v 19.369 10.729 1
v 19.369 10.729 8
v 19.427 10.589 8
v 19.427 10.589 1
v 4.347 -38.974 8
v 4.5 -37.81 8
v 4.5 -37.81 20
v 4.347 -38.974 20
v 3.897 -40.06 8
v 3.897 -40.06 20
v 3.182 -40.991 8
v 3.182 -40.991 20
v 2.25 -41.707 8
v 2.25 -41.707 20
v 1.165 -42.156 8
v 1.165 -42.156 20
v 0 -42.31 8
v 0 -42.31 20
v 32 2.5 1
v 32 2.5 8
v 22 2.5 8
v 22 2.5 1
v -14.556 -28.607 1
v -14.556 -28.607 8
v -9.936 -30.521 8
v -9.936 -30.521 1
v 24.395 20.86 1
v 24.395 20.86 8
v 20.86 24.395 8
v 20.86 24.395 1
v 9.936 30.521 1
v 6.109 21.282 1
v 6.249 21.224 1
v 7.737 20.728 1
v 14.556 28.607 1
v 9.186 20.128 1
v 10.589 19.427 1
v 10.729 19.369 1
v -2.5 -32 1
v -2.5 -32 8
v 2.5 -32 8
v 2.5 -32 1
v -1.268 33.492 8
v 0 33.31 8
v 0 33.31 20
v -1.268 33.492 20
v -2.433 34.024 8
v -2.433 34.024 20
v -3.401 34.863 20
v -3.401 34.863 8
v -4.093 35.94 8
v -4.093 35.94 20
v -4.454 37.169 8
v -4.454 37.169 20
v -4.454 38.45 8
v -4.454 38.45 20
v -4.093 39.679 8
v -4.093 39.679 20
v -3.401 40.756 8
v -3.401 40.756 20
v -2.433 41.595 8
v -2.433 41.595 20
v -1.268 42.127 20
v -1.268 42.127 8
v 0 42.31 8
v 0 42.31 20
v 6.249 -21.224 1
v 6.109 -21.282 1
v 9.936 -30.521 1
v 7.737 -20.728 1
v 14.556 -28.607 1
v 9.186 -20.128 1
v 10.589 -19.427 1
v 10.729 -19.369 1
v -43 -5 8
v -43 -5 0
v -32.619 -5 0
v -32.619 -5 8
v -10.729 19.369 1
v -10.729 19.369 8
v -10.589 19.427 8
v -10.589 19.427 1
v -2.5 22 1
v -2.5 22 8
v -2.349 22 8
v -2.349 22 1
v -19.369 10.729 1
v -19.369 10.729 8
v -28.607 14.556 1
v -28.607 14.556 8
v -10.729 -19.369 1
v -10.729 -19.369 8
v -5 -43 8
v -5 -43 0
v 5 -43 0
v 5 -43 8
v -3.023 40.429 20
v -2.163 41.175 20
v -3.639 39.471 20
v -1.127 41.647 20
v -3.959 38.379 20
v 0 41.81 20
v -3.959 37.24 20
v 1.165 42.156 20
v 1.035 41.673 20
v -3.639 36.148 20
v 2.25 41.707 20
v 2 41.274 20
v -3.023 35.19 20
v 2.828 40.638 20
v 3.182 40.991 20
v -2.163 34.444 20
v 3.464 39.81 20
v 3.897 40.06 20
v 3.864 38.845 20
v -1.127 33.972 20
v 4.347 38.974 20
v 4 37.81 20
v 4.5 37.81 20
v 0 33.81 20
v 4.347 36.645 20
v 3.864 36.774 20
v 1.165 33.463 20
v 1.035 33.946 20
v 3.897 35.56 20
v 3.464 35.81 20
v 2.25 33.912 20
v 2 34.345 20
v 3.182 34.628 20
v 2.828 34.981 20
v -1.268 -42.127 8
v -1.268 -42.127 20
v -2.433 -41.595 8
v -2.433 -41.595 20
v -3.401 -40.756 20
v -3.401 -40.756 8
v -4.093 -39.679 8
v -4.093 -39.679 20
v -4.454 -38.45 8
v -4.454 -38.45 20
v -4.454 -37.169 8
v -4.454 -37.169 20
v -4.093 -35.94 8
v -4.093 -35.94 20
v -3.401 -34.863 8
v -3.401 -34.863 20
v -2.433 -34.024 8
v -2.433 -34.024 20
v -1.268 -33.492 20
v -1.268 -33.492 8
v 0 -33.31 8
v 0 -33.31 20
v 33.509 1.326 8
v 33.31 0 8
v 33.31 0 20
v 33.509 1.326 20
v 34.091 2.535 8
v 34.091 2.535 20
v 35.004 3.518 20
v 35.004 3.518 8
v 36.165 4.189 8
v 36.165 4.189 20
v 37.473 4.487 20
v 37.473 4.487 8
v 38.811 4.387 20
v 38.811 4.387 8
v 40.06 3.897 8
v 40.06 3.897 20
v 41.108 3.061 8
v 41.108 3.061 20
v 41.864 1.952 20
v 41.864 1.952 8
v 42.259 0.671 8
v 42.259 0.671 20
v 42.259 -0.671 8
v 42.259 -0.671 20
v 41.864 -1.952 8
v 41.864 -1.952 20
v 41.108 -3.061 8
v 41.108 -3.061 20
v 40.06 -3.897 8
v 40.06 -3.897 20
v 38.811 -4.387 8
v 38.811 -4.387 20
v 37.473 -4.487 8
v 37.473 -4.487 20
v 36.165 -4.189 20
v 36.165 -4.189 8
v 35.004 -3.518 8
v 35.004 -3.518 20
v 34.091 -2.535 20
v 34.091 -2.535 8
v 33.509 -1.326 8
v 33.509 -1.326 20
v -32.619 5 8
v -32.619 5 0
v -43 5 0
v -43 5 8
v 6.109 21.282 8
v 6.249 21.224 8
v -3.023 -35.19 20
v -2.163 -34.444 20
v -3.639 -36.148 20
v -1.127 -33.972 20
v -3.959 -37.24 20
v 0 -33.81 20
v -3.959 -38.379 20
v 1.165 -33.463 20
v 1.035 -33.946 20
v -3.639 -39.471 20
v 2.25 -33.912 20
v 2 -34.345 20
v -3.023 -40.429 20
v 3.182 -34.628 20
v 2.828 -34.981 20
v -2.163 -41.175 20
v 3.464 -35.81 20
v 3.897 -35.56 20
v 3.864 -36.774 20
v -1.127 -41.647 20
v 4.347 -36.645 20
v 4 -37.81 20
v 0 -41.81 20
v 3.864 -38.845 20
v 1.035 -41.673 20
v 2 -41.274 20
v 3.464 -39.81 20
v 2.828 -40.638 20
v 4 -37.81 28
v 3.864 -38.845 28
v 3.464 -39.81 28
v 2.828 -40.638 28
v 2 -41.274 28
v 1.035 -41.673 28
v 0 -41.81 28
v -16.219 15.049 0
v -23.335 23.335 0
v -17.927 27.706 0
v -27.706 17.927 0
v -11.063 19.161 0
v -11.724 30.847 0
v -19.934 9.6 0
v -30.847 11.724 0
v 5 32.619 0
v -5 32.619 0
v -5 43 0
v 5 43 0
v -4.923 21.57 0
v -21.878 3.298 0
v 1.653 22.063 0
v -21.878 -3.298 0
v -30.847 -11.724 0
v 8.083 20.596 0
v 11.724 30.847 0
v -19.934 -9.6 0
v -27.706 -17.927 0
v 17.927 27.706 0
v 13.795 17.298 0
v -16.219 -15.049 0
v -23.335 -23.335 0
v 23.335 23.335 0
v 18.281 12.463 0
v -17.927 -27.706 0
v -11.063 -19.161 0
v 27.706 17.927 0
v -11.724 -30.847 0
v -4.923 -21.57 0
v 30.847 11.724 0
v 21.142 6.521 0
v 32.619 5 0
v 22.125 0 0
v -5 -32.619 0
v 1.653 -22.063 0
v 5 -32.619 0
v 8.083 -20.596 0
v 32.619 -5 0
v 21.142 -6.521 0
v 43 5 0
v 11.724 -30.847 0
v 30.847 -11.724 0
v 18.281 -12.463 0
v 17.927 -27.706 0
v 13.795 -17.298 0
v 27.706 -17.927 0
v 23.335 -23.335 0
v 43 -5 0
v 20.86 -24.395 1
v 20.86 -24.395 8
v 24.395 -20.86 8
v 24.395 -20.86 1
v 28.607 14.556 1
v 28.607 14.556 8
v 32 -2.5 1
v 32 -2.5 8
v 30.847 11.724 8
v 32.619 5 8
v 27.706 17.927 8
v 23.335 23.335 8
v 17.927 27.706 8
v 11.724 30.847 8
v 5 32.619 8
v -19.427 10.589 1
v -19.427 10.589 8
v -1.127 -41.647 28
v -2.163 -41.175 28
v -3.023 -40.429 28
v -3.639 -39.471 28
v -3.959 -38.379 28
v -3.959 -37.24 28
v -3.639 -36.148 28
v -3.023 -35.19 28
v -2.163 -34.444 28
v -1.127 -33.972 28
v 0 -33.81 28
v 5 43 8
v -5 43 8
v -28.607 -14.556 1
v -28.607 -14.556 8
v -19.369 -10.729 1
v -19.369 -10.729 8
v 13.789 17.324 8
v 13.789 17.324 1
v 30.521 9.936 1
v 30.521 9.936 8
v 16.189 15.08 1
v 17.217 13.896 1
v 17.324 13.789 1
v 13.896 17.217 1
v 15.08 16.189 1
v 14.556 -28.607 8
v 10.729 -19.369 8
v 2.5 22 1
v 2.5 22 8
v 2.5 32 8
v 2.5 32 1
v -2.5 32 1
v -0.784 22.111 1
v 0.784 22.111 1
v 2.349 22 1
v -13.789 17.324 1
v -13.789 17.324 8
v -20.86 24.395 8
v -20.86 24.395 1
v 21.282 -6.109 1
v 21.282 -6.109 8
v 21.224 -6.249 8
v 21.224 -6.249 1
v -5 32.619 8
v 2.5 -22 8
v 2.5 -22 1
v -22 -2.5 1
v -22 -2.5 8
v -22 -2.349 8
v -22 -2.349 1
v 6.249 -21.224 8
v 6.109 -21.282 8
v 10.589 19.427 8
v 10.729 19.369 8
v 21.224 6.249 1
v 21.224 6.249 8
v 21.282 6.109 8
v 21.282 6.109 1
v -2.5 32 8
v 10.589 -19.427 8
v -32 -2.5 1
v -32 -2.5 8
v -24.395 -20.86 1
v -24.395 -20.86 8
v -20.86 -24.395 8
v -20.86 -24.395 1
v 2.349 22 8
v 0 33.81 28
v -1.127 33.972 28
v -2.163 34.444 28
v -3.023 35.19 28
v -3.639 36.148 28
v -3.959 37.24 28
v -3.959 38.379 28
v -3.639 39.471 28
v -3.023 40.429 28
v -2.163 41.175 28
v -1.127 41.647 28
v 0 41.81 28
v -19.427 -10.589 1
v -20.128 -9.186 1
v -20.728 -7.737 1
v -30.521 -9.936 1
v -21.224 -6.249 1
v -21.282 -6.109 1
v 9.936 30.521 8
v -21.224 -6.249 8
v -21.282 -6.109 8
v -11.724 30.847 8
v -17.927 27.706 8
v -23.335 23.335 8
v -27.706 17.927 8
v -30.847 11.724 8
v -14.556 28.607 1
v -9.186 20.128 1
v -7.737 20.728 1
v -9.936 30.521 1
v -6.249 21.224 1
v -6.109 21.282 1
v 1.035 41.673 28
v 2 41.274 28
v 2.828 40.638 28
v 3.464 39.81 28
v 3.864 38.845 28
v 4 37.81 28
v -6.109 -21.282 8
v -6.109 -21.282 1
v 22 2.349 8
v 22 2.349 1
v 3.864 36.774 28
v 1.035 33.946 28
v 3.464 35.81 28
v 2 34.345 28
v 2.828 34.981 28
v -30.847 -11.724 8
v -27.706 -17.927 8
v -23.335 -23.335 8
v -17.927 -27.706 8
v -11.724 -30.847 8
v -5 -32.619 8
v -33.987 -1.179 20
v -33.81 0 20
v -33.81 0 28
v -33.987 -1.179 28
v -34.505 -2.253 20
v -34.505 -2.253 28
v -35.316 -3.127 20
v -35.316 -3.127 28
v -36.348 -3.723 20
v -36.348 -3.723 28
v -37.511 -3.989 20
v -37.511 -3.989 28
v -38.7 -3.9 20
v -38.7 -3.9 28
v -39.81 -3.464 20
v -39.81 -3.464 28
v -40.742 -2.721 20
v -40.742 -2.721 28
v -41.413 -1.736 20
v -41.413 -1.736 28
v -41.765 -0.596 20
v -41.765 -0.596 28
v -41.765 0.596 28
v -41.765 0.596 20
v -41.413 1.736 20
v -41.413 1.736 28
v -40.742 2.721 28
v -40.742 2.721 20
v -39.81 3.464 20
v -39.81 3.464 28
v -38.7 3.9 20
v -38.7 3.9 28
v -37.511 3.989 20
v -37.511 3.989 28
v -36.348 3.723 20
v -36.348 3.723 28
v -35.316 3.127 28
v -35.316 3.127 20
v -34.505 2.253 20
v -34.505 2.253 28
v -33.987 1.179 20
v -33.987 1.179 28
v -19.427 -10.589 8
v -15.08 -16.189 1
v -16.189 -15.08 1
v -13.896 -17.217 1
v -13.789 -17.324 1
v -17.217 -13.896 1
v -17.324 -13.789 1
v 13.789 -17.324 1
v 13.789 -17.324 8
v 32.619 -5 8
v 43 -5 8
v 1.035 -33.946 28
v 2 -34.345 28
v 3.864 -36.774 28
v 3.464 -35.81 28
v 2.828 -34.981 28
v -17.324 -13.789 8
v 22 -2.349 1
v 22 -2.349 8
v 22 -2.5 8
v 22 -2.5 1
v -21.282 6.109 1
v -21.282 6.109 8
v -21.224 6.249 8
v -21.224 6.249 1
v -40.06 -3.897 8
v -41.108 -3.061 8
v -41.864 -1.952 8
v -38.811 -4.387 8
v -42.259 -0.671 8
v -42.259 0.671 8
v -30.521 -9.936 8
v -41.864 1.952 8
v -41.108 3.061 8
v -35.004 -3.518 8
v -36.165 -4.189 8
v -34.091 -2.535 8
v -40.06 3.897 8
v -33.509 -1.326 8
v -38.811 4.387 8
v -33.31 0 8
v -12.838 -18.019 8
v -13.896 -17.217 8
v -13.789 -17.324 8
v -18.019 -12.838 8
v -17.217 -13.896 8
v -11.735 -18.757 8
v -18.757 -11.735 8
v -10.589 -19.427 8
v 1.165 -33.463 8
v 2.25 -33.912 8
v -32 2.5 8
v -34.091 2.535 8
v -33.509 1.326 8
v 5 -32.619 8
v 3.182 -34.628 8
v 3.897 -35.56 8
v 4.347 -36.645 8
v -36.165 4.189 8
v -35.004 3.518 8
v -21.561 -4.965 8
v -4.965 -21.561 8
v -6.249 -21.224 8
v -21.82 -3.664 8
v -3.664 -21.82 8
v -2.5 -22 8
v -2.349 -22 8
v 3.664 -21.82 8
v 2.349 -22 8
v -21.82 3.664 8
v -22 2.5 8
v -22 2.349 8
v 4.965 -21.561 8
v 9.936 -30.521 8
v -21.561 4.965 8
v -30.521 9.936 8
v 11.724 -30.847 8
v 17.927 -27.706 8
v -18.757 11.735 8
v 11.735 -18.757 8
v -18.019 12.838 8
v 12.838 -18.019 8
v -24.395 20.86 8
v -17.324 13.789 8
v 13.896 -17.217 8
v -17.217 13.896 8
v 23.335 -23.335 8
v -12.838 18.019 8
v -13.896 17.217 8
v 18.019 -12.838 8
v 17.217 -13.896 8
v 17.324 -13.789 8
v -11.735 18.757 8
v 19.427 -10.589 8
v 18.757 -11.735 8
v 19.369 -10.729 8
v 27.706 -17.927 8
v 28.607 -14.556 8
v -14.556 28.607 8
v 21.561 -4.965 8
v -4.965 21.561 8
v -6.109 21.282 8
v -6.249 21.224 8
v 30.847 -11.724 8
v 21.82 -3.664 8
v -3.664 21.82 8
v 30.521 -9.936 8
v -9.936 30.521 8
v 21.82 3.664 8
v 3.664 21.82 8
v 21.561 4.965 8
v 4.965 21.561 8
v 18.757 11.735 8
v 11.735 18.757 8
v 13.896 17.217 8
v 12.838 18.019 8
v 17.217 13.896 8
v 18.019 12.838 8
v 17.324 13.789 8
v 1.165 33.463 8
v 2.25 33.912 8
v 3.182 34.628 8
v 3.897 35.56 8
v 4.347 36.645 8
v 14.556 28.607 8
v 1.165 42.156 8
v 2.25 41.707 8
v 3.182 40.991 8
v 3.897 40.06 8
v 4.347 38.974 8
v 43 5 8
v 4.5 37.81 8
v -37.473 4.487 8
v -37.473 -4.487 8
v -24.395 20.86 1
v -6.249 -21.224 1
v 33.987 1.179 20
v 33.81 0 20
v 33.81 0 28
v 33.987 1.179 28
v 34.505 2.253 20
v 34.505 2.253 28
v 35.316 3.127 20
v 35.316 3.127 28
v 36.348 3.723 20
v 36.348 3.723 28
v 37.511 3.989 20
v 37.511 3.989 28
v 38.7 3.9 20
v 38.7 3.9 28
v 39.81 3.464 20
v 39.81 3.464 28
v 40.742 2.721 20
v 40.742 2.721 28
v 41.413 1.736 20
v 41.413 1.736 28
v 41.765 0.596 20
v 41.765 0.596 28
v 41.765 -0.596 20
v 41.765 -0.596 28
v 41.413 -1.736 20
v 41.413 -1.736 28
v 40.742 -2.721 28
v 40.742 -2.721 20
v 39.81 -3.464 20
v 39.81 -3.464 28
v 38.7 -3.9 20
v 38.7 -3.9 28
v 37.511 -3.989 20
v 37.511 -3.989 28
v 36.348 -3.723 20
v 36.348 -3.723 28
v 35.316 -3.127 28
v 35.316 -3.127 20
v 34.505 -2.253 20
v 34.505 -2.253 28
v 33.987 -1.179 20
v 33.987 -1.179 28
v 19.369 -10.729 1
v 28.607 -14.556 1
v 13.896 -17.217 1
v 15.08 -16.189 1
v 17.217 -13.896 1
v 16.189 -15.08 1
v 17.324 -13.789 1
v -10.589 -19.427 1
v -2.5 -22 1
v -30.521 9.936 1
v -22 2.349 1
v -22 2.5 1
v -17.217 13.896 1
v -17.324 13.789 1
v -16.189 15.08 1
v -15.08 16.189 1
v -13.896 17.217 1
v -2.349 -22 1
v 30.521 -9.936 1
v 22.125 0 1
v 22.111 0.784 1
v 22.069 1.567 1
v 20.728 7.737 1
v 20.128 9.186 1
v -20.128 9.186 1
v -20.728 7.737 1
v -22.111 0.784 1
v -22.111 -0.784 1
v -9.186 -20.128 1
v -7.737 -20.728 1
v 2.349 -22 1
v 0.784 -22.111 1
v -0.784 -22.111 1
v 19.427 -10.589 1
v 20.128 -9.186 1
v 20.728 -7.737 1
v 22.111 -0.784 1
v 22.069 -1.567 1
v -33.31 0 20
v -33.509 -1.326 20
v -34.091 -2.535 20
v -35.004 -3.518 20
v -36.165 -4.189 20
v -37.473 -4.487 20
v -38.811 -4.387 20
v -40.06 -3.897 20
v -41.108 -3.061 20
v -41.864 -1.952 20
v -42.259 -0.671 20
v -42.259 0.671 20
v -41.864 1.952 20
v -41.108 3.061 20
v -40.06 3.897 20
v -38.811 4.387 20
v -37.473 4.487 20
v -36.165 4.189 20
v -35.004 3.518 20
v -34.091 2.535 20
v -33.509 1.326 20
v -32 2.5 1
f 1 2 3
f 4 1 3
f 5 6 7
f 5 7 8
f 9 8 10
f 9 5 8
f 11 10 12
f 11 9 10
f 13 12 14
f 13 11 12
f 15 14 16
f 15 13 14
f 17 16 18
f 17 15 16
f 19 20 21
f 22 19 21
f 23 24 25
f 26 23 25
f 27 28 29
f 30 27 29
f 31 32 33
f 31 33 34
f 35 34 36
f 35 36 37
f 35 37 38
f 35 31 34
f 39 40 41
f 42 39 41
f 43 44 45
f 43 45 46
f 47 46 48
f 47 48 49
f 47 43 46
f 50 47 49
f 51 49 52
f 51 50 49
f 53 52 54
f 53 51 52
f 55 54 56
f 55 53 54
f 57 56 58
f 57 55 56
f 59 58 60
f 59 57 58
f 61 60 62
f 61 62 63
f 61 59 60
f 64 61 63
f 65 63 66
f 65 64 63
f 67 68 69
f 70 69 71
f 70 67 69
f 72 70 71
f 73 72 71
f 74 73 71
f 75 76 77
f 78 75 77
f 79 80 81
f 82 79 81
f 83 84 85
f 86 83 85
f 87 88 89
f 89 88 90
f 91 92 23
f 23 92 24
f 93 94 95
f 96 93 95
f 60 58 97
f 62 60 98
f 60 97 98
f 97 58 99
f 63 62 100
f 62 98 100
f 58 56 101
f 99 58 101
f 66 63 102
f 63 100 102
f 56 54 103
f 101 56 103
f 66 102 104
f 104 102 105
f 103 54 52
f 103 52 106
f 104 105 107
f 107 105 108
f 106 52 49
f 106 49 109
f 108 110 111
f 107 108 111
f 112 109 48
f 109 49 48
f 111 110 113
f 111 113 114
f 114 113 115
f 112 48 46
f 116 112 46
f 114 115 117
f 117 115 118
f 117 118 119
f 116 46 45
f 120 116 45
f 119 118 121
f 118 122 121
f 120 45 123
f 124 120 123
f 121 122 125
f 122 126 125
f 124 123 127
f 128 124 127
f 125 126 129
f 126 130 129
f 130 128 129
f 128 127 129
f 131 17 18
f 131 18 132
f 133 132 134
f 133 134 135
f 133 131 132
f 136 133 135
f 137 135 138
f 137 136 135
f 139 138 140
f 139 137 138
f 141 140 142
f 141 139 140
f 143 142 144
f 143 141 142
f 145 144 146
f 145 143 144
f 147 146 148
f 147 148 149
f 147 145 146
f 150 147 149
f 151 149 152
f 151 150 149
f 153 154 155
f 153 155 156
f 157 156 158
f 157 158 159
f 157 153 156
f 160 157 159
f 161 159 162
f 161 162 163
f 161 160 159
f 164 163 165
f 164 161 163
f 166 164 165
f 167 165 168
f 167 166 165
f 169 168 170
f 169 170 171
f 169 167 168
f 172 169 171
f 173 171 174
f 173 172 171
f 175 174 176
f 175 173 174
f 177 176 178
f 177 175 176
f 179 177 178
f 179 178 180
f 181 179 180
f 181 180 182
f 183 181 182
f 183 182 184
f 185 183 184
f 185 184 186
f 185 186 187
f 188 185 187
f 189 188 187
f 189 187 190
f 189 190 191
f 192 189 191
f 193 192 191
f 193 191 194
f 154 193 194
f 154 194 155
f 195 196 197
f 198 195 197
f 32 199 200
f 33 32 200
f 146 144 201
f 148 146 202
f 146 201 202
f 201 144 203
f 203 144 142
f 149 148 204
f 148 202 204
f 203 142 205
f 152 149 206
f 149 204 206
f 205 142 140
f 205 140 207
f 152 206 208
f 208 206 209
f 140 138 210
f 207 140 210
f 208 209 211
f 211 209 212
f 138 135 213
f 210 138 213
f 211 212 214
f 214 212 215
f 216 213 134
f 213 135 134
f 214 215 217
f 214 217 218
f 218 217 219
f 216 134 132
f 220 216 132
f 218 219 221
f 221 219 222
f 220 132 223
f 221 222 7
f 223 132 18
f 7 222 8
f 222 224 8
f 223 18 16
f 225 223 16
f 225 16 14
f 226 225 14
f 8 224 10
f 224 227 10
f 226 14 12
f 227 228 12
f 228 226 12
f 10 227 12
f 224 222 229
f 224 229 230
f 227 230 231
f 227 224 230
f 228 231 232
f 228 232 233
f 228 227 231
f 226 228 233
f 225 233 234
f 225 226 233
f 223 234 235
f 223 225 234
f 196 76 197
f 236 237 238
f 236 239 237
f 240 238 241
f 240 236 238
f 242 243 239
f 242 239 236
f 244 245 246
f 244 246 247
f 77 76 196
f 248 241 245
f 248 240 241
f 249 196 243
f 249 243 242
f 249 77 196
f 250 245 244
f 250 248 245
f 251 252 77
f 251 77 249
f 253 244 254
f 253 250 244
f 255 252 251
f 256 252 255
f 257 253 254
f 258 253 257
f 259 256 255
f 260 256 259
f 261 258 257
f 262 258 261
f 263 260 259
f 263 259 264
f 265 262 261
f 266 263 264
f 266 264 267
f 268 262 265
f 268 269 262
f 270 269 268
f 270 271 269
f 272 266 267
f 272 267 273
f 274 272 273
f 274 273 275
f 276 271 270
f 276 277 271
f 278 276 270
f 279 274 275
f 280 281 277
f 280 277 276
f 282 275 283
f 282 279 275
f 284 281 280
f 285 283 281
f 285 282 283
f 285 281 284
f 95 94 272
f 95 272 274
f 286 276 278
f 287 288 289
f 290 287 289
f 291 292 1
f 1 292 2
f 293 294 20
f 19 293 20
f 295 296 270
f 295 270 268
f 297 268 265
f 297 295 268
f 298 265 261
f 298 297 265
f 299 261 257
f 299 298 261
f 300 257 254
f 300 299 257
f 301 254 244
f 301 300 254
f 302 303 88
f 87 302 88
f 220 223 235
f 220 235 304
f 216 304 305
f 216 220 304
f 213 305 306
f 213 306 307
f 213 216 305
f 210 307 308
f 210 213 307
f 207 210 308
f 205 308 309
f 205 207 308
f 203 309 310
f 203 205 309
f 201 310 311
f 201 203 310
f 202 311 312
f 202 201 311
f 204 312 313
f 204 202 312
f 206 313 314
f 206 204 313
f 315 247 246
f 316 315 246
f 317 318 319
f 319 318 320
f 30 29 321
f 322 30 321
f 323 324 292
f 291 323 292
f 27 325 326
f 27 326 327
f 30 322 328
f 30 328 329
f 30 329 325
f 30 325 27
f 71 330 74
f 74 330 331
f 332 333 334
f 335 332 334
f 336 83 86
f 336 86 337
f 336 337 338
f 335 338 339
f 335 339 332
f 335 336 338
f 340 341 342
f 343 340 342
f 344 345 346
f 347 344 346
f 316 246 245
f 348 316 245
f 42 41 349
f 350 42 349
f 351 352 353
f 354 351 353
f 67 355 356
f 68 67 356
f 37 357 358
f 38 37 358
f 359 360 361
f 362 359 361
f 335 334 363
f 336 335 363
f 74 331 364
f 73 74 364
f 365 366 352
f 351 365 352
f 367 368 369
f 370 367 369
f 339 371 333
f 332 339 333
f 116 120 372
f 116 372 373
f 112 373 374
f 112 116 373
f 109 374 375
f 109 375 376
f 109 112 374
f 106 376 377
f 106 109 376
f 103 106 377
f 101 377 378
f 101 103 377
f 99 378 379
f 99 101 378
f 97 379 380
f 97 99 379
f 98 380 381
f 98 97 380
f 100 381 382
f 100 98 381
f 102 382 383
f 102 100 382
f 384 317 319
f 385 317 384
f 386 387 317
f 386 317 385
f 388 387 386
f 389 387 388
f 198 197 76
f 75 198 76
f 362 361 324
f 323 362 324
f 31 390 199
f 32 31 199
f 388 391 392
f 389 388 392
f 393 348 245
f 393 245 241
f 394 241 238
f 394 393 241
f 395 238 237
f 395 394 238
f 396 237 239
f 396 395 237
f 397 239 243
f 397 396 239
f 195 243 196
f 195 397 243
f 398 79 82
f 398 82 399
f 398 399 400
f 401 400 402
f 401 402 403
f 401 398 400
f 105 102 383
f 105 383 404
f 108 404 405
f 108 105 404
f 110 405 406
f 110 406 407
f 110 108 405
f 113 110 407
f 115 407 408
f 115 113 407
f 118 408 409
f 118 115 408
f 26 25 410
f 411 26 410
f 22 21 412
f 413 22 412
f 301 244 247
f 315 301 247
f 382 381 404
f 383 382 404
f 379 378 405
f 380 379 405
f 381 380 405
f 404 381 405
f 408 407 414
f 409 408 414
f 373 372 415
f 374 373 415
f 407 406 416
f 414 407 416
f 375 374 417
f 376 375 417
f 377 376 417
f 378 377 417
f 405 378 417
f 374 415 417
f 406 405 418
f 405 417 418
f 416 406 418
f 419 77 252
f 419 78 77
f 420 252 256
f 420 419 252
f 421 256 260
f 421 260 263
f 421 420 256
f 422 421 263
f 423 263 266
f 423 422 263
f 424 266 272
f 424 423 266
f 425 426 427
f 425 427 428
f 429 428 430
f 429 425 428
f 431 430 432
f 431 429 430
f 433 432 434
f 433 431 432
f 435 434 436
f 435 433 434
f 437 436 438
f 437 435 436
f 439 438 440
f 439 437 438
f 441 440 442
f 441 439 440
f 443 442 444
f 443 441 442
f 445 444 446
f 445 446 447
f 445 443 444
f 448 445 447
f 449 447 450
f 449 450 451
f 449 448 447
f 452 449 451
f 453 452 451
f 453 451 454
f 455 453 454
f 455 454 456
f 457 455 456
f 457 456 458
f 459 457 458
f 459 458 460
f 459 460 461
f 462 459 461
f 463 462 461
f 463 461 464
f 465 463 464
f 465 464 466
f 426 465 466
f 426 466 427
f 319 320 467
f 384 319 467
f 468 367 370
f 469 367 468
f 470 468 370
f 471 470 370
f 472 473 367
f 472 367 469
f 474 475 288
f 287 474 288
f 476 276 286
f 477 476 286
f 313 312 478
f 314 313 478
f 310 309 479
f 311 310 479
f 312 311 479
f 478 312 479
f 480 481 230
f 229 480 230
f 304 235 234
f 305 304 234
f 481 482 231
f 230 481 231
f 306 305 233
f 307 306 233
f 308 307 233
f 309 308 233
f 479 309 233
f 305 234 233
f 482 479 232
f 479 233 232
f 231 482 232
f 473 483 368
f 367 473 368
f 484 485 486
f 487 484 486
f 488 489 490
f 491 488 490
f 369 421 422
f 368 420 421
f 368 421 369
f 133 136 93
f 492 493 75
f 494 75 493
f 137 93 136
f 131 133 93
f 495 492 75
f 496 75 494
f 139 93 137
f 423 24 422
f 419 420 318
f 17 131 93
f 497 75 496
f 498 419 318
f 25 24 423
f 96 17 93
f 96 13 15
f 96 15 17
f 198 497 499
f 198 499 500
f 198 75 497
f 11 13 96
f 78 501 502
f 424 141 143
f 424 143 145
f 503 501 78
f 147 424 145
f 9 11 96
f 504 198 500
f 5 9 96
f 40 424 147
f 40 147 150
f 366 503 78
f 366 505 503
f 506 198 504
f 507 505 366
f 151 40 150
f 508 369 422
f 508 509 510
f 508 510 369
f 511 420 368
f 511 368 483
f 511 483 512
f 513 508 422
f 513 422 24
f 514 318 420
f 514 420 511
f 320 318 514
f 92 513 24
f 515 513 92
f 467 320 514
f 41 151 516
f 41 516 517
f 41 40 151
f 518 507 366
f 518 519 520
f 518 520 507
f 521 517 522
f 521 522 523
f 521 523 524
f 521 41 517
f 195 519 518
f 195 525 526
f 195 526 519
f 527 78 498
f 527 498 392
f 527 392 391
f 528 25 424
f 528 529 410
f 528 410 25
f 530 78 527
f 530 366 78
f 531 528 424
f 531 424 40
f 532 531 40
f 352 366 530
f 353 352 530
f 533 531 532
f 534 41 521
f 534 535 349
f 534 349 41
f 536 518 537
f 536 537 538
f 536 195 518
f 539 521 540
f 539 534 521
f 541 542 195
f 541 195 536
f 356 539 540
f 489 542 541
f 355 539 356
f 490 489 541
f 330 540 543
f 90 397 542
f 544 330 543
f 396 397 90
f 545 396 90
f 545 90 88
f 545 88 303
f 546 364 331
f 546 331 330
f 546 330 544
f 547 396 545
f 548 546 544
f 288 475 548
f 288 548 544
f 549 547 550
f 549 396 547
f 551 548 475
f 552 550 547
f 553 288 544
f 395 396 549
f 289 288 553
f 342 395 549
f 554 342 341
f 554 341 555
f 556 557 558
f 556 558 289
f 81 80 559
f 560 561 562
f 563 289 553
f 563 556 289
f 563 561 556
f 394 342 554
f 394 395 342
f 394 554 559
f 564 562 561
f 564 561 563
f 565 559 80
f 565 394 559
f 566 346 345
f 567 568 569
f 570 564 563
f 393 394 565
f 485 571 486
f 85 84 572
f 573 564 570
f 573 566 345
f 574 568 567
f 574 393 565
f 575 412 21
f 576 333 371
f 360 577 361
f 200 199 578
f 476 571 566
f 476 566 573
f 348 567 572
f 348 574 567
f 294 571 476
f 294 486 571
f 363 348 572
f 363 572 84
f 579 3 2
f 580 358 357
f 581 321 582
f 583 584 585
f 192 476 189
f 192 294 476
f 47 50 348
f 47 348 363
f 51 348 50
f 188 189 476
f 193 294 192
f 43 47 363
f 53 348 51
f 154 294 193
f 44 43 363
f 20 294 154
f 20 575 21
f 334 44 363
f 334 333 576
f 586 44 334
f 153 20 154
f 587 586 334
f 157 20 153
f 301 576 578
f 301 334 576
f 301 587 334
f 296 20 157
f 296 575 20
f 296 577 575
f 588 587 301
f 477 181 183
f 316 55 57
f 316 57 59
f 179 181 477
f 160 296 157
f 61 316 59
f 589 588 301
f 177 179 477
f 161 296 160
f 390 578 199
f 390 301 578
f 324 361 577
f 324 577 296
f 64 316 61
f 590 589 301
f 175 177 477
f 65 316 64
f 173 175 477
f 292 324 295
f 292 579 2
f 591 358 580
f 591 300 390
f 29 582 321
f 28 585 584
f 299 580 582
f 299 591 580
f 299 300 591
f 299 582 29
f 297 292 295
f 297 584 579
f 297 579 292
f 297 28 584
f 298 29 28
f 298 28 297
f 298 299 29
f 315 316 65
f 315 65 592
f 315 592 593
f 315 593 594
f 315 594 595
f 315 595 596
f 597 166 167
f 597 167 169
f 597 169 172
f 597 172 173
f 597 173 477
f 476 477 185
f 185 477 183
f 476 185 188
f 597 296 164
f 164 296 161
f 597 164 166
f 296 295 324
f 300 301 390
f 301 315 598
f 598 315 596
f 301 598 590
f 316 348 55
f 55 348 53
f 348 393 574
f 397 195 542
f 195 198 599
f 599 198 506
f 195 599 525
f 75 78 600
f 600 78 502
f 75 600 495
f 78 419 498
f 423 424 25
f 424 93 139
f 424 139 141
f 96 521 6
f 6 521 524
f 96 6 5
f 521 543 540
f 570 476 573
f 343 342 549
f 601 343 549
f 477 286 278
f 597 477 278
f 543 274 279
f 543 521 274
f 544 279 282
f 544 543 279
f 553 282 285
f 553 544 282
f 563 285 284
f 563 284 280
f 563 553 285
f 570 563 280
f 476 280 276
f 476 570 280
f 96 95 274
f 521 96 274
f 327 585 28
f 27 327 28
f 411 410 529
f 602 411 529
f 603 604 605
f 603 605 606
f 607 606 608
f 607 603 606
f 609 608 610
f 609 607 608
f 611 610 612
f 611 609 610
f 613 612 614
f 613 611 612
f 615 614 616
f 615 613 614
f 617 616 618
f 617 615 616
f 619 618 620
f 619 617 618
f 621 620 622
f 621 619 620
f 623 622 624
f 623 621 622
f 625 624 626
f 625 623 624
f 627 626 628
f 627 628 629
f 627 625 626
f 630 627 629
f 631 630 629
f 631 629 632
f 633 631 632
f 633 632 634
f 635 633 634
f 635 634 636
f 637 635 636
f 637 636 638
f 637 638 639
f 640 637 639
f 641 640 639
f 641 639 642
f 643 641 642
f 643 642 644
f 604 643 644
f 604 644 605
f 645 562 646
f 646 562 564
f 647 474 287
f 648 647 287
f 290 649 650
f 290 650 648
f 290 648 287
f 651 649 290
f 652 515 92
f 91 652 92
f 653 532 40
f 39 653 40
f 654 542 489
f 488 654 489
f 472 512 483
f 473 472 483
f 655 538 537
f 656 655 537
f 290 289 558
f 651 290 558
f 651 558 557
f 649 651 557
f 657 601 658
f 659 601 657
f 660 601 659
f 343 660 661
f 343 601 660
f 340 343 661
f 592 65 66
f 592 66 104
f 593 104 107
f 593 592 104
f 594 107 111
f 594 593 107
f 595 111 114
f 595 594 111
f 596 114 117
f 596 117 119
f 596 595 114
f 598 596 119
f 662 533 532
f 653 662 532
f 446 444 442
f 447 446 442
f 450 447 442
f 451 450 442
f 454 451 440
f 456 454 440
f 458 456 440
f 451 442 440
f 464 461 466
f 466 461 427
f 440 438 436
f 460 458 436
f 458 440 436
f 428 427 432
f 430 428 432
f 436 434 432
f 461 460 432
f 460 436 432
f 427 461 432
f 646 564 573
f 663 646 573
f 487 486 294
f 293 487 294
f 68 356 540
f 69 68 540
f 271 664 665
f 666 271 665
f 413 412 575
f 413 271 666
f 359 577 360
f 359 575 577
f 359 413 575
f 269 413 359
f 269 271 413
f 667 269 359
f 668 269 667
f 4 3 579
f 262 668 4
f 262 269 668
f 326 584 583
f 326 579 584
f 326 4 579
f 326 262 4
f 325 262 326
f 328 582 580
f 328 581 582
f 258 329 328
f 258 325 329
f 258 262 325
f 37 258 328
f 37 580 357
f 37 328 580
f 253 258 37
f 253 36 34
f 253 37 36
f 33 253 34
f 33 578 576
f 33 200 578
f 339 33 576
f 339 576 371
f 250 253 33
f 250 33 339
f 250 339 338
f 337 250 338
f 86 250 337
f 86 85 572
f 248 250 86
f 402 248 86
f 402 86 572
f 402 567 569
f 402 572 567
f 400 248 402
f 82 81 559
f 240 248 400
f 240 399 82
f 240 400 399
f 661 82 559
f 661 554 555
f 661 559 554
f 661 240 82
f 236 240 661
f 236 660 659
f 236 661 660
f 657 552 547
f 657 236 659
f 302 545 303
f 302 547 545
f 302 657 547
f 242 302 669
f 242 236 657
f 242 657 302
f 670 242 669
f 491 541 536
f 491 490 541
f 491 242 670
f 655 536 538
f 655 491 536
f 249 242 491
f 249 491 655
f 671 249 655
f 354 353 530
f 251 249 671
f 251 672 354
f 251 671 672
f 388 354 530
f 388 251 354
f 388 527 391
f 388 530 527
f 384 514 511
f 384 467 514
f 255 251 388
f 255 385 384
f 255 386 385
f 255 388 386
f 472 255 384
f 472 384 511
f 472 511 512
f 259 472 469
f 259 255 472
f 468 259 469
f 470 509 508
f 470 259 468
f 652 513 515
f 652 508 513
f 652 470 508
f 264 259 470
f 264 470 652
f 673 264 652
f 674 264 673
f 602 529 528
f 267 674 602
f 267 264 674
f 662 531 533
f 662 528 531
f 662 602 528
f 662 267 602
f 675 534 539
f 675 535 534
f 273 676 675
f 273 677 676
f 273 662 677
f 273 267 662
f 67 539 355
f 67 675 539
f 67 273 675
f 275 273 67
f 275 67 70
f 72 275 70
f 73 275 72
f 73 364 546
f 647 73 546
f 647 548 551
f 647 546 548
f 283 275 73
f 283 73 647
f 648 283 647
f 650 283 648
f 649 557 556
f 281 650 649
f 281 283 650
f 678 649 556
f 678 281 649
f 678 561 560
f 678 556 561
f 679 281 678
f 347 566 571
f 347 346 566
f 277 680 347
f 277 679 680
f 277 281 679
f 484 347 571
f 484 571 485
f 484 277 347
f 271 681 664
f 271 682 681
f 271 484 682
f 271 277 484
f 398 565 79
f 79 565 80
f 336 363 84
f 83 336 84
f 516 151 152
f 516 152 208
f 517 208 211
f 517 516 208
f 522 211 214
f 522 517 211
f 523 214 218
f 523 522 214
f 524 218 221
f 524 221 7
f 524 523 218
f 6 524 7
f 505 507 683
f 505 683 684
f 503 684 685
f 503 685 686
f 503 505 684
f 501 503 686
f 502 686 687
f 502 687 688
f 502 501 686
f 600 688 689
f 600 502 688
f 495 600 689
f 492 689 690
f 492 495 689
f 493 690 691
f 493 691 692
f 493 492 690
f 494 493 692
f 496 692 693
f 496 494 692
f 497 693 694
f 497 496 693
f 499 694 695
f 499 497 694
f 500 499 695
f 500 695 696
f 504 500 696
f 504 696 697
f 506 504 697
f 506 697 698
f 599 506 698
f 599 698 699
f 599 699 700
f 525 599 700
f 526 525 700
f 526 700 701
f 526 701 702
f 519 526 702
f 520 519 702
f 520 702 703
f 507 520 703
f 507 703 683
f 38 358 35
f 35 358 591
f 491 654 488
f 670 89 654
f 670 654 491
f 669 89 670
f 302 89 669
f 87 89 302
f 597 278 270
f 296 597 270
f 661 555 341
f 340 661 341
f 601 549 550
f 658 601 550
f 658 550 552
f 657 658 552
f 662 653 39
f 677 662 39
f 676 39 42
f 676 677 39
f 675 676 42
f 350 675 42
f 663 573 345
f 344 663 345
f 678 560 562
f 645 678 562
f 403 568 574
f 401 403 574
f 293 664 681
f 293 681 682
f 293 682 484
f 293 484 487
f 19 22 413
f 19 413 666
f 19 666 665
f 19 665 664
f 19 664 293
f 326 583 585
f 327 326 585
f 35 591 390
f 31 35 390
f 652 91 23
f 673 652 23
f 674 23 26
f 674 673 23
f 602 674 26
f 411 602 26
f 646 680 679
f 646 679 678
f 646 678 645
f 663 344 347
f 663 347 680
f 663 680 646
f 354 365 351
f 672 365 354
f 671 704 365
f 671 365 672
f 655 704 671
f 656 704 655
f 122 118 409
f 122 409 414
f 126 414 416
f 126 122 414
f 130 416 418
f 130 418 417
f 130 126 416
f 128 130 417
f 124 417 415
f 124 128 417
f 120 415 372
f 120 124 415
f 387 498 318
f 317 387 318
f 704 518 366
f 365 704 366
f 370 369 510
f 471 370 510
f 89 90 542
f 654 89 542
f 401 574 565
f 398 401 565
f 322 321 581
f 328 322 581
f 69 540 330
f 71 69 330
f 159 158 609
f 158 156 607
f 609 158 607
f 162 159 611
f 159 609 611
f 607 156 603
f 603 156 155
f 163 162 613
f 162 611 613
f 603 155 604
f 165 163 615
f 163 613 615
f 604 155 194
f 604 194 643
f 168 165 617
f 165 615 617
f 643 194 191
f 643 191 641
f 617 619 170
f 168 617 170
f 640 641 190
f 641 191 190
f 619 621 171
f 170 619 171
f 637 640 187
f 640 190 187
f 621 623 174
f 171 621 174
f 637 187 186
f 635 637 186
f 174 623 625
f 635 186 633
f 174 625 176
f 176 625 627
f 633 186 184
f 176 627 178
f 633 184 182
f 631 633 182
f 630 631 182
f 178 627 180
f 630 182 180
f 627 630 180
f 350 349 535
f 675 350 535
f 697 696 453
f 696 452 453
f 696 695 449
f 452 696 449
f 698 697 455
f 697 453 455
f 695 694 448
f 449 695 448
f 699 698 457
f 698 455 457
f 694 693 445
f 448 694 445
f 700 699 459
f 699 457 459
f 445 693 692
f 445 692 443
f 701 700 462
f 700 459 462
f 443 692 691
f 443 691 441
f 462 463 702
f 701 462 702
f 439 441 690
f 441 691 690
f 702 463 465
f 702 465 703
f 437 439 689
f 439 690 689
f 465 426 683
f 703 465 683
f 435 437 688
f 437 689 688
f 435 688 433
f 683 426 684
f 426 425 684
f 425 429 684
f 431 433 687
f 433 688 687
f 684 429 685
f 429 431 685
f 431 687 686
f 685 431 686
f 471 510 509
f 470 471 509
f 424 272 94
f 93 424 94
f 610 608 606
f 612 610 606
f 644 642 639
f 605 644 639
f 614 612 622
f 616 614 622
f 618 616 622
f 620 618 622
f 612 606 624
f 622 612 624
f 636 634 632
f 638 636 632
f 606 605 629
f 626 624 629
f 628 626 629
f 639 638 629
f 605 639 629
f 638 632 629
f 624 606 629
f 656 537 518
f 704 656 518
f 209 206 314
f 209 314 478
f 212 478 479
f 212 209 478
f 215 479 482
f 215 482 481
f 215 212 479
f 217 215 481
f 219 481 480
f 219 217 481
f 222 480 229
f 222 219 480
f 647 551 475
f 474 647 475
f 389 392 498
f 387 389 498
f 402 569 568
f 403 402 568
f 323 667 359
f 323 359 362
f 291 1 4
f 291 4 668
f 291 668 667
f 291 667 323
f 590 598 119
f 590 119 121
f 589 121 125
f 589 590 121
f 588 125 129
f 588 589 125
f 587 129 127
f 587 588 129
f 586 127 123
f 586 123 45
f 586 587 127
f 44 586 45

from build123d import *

# Parameters (mm, degrees)
F0_W      = 33
F0_H      = 8
F2_R      = 22.125
F3_DEPTH  = 25
F5_DEPTH  = 7
F7_DEPTH  = 8
F8_R      = 4
F9_DEPTH  = 25
F10_R     = 4.5
F10_R_2   = 4
F11_DEPTH = 20
F12_DEPTH = 28


with BuildPart() as f1:
    # F0 (on Front) → F1 (revolve)
    with BuildSketch(Plane.XZ):
        with Locations((16.5, 4)):
            Rectangle(F0_W, F0_H)
    revolve(axis=Axis((0, 0, 4), (0, 0, 1)))

    # F2 (on Top) → F3 (cut)
    with BuildSketch(Plane.XY):
        Circle(F2_R)
    extrude(amount=F3_DEPTH, mode=Mode.SUBTRACT)

    # F4 (on face) → F5 (cut)
    with BuildSketch(Plane.XY.offset(8)):
        Polygon((-2.5, 22), (0, 22), (2.5, 22), (2.5, 32), (-2.5, 32), align=None)
        Polygon((-14.555568667, 28.6074364594), (-10.7287343433, 19.3686411343), (-8.419035512, 20.3253497152), (-6.1093366808, 21.2820582962), (-9.9361710044, 30.5208536213), align=None)
        Polygon((-24.3951839509, 20.859650045), (-17.3241161391, 13.7885822331), (-15.5563491861, 15.5563491861), (-13.7885822331, 17.3241161391), (-20.859650045, 24.3951839509), align=None)
        Polygon((-30.5208536213, 9.9361710044), (-21.2820582962, 6.1093366808), (-20.3253497152, 8.419035512), (-19.3686411343, 10.7287343433), (-28.6074364594, 14.555568667), align=None)
        Polygon((-32, -2.5), (-22, -2.5), (-22, 0), (-22, 2.5), (-32, 2.5), align=None)
        Polygon((-28.6074364594, -14.555568667), (-19.3686411343, -10.7287343433), (-20.3253497152, -8.419035512), (-21.2820582962, -6.1093366808), (-30.5208536213, -9.9361710044), align=None)
        Polygon((-20.859650045, -24.3951839509), (-13.7885822331, -17.3241161391), (-15.5563491861, -15.5563491861), (-17.3241161391, -13.7885822331), (-24.3951839509, -20.859650045), align=None)
        Polygon((-9.9361710044, -30.5208536213), (-6.1093366808, -21.2820582962), (-8.419035512, -20.3253497152), (-10.7287343433, -19.3686411343), (-14.555568667, -28.6074364594), align=None)
        Polygon((2.5, -32), (2.5, -22), (0, -22), (-2.5, -22), (-2.5, -32), align=None)
        Polygon((14.555568667, -28.6074364594), (10.7287343433, -19.3686411343), (8.419035512, -20.3253497152), (6.1093366808, -21.2820582962), (9.9361710044, -30.5208536213), align=None)
        Polygon((24.3951839509, -20.859650045), (17.3241161391, -13.7885822331), (15.5563491861, -15.5563491861), (13.7885822331, -17.3241161391), (20.859650045, -24.3951839509), align=None)
        Polygon((30.5208536213, -9.9361710044), (21.2820582962, -6.1093366808), (20.3253497152, -8.419035512), (19.3686411343, -10.7287343433), (28.6074364594, -14.555568667), align=None)
        Polygon((32, 2.5), (22, 2.5), (22, 0), (22, -2.5), (32, -2.5), align=None)
        Polygon((28.6074364594, 14.555568667), (19.3686411343, 10.7287343433), (20.3253497152, 8.419035512), (21.2820582962, 6.1093366808), (30.5208536213, 9.9361710044), align=None)
        Polygon((20.859650045, 24.3951839509), (13.7885822331, 17.3241161391), (15.5563491861, 15.5563491861), (17.3241161391, 13.7885822331), (24.3951839509, 20.859650045), align=None)
        Polygon((9.9361710044, 30.5208536213), (6.1093366808, 21.2820582962), (8.419035512, 20.3253497152), (10.7287343433, 19.3686411343), (14.555568667, 28.6074364594), align=None)
    extrude(amount=-F5_DEPTH, mode=Mode.SUBTRACT)

    # F6 (on Top) → F7 (join)
    with BuildSketch(Plane.XY):
        Polygon((43, -5), (43, 0), (43, 5), (32.6190128606, 5), (32.6190128606, -5), align=None)
        Polygon((5, 32.6190128606), (5, 43), (0, 43), (-5, 43), (-5, 32.6190128606), align=None)
        Polygon((-32.6190128606, 5), (-43, 5), (-43, 0), (-43, -5), (-32.6190128606, -5), align=None)
        Polygon((-5, -32.6190128606), (-5, -43), (0, -43), (5, -43), (5, -32.6190128606), align=None)
    extrude(amount=F7_DEPTH)

    # F8 (on face) → F9 (cut)
    with BuildSketch(Plane.XY.offset(8)):
        with Locations((0, 37.8095064303)):
            Circle(F8_R)
        with Locations((37.8095064303, 0)):
            Circle(F8_R)
        with Locations((-37.8095064303, 0)):
            Circle(F8_R)
        with Locations((0, -37.8095064303)):
            Circle(F8_R)
    extrude(amount=-F9_DEPTH, mode=Mode.SUBTRACT)

    # F10 (on face) → F11 (join)
    with BuildSketch(Plane(origin=(0, 0, 0), x_dir=(1, 0, 0), z_dir=(0, 0, -1))):
        with BuildLine():
            Line((0, -41.8095064303), (0, -37.8095064303))
            Line((0, -37.8095064303), (0, -33.8095064303))
            ThreePointArc((0, -33.8095064303), (-4, -37.8095064303), (0, -41.8095064303))
        make_face()
        with BuildLine():
            Line((0, -33.8095064303), (0, -37.8095064303))
            Line((0, -37.8095064303), (0, -41.8095064303))
            ThreePointArc((0, -41.8095064303), (2.8284271247, -40.637933555), (4, -37.8095064303))
            ThreePointArc((4, -37.8095064303), (2.8284271247, -34.9810793056), (0, -33.8095064303))
        make_face()
        with BuildLine():
            ThreePointArc((42.3095064303, 0), (37.8095064303, 4.5), (33.3095064303, 0))
            ThreePointArc((33.3095064303, 0), (37.8095064303, -4.5), (42.3095064303, 0))
        make_face()
        with BuildLine():
            ThreePointArc((41.8095064303, 0), (37.8095064303, -4), (33.8095064303, 0))
            ThreePointArc((33.8095064303, 0), (37.8095064303, 4), (41.8095064303, 0))
        make_face(mode=Mode.SUBTRACT)
        with BuildLine():
            ThreePointArc((0, 41.8095064303), (-4, 37.8095064303), (0, 33.8095064303))
            Line((0, 33.8095064303), (0, 37.8095064303))
            Line((0, 37.8095064303), (0, 41.8095064303))
        make_face()
        with BuildLine():
            Line((0, 37.8095064303), (0, 33.8095064303))
            ThreePointArc((0, 33.8095064303), (2.8284271247, 34.9810793056), (4, 37.8095064303))
            ThreePointArc((4, 37.8095064303), (2.8284271247, 40.637933555), (0, 41.8095064303))
            Line((0, 41.8095064303), (0, 37.8095064303))
        make_face()
        with BuildLine():
            Line((0, -33.3095064303), (0, -33.8095064303))
            ThreePointArc((0, -33.8095064303), (2.8284271247, -34.9810793056), (4, -37.8095064303))
            ThreePointArc((4, -37.8095064303), (2.8284271247, -40.637933555), (0, -41.8095064303))
            Line((0, -41.8095064303), (0, -42.3095064303))
            ThreePointArc((0, -42.3095064303), (3.1819805153, -40.9914869456), (4.5, -37.8095064303))
            ThreePointArc((4.5, -37.8095064303), (3.1819805153, -34.627525915), (0, -33.3095064303))
        make_face()
        with BuildLine():
            ThreePointArc((0, -41.8095064303), (-4, -37.8095064303), (0, -33.8095064303))
            Line((0, -33.8095064303), (0, -33.3095064303))
            ThreePointArc((0, -33.3095064303), (-4.5, -37.8095064303), (0, -42.3095064303))
            Line((0, -42.3095064303), (0, -41.8095064303))
        make_face()
        with Locations((-37.8095064303, 0)):
            Circle(F10_R)
        with Locations((-37.8095064303, 0)):
            Circle(F10_R_2, mode=Mode.SUBTRACT)
        with BuildLine():
            ThreePointArc((0, 42.3095064303), (-4.5, 37.8095064303), (0, 33.3095064303))
            Line((0, 33.3095064303), (0, 33.8095064303))
            ThreePointArc((0, 33.8095064303), (-4, 37.8095064303), (0, 41.8095064303))
            Line((0, 41.8095064303), (0, 42.3095064303))
        make_face()
        with BuildLine():
            Line((0, 33.8095064303), (0, 33.3095064303))
            ThreePointArc((0, 33.3095064303), (3.1819805153, 34.627525915), (4.5, 37.8095064303))
            ThreePointArc((4.5, 37.8095064303), (3.1819805153, 40.9914869456), (0, 42.3095064303))
            Line((0, 42.3095064303), (0, 41.8095064303))
            ThreePointArc((0, 41.8095064303), (2.8284271247, 40.637933555), (4, 37.8095064303))
            ThreePointArc((4, 37.8095064303), (2.8284271247, 34.9810793056), (0, 33.8095064303))
        make_face()
    extrude(amount=-F11_DEPTH)

    # F10 (on face) → F12 (join)
    with BuildSketch(Plane(origin=(0, 0, 0), x_dir=(1, 0, 0), z_dir=(0, 0, -1))):
        with BuildLine():
            Line((0, -41.8095064303), (0, -37.8095064303))
            Line((0, -37.8095064303), (0, -33.8095064303))
            ThreePointArc((0, -33.8095064303), (-4, -37.8095064303), (0, -41.8095064303))
        make_face()
        with BuildLine():
            Line((0, -33.8095064303), (0, -37.8095064303))
            Line((0, -37.8095064303), (0, -41.8095064303))
            ThreePointArc((0, -41.8095064303), (2.8284271247, -40.637933555), (4, -37.8095064303))
            ThreePointArc((4, -37.8095064303), (2.8284271247, -34.9810793056), (0, -33.8095064303))
        make_face()
        with Locations((-37.8095064303, 0)):
            Circle(F10_R_2)
        with BuildLine():
            ThreePointArc((41.8095064303, 0), (37.8095064303, 4), (33.8095064303, 0))
            ThreePointArc((33.8095064303, 0), (37.8095064303, -4), (41.8095064303, 0))
        make_face()
        with BuildLine():
            ThreePointArc((0, 41.8095064303), (-4, 37.8095064303), (0, 33.8095064303))
            Line((0, 33.8095064303), (0, 37.8095064303))
            Line((0, 37.8095064303), (0, 41.8095064303))
        make_face()
        with BuildLine():
            Line((0, 37.8095064303), (0, 33.8095064303))
            ThreePointArc((0, 33.8095064303), (2.8284271247, 34.9810793056), (4, 37.8095064303))
            ThreePointArc((4, 37.8095064303), (2.8284271247, 40.637933555), (0, 41.8095064303))
            Line((0, 41.8095064303), (0, 37.8095064303))
        make_face()
    extrude(amount=-F12_DEPTH)


solid = f1.part
